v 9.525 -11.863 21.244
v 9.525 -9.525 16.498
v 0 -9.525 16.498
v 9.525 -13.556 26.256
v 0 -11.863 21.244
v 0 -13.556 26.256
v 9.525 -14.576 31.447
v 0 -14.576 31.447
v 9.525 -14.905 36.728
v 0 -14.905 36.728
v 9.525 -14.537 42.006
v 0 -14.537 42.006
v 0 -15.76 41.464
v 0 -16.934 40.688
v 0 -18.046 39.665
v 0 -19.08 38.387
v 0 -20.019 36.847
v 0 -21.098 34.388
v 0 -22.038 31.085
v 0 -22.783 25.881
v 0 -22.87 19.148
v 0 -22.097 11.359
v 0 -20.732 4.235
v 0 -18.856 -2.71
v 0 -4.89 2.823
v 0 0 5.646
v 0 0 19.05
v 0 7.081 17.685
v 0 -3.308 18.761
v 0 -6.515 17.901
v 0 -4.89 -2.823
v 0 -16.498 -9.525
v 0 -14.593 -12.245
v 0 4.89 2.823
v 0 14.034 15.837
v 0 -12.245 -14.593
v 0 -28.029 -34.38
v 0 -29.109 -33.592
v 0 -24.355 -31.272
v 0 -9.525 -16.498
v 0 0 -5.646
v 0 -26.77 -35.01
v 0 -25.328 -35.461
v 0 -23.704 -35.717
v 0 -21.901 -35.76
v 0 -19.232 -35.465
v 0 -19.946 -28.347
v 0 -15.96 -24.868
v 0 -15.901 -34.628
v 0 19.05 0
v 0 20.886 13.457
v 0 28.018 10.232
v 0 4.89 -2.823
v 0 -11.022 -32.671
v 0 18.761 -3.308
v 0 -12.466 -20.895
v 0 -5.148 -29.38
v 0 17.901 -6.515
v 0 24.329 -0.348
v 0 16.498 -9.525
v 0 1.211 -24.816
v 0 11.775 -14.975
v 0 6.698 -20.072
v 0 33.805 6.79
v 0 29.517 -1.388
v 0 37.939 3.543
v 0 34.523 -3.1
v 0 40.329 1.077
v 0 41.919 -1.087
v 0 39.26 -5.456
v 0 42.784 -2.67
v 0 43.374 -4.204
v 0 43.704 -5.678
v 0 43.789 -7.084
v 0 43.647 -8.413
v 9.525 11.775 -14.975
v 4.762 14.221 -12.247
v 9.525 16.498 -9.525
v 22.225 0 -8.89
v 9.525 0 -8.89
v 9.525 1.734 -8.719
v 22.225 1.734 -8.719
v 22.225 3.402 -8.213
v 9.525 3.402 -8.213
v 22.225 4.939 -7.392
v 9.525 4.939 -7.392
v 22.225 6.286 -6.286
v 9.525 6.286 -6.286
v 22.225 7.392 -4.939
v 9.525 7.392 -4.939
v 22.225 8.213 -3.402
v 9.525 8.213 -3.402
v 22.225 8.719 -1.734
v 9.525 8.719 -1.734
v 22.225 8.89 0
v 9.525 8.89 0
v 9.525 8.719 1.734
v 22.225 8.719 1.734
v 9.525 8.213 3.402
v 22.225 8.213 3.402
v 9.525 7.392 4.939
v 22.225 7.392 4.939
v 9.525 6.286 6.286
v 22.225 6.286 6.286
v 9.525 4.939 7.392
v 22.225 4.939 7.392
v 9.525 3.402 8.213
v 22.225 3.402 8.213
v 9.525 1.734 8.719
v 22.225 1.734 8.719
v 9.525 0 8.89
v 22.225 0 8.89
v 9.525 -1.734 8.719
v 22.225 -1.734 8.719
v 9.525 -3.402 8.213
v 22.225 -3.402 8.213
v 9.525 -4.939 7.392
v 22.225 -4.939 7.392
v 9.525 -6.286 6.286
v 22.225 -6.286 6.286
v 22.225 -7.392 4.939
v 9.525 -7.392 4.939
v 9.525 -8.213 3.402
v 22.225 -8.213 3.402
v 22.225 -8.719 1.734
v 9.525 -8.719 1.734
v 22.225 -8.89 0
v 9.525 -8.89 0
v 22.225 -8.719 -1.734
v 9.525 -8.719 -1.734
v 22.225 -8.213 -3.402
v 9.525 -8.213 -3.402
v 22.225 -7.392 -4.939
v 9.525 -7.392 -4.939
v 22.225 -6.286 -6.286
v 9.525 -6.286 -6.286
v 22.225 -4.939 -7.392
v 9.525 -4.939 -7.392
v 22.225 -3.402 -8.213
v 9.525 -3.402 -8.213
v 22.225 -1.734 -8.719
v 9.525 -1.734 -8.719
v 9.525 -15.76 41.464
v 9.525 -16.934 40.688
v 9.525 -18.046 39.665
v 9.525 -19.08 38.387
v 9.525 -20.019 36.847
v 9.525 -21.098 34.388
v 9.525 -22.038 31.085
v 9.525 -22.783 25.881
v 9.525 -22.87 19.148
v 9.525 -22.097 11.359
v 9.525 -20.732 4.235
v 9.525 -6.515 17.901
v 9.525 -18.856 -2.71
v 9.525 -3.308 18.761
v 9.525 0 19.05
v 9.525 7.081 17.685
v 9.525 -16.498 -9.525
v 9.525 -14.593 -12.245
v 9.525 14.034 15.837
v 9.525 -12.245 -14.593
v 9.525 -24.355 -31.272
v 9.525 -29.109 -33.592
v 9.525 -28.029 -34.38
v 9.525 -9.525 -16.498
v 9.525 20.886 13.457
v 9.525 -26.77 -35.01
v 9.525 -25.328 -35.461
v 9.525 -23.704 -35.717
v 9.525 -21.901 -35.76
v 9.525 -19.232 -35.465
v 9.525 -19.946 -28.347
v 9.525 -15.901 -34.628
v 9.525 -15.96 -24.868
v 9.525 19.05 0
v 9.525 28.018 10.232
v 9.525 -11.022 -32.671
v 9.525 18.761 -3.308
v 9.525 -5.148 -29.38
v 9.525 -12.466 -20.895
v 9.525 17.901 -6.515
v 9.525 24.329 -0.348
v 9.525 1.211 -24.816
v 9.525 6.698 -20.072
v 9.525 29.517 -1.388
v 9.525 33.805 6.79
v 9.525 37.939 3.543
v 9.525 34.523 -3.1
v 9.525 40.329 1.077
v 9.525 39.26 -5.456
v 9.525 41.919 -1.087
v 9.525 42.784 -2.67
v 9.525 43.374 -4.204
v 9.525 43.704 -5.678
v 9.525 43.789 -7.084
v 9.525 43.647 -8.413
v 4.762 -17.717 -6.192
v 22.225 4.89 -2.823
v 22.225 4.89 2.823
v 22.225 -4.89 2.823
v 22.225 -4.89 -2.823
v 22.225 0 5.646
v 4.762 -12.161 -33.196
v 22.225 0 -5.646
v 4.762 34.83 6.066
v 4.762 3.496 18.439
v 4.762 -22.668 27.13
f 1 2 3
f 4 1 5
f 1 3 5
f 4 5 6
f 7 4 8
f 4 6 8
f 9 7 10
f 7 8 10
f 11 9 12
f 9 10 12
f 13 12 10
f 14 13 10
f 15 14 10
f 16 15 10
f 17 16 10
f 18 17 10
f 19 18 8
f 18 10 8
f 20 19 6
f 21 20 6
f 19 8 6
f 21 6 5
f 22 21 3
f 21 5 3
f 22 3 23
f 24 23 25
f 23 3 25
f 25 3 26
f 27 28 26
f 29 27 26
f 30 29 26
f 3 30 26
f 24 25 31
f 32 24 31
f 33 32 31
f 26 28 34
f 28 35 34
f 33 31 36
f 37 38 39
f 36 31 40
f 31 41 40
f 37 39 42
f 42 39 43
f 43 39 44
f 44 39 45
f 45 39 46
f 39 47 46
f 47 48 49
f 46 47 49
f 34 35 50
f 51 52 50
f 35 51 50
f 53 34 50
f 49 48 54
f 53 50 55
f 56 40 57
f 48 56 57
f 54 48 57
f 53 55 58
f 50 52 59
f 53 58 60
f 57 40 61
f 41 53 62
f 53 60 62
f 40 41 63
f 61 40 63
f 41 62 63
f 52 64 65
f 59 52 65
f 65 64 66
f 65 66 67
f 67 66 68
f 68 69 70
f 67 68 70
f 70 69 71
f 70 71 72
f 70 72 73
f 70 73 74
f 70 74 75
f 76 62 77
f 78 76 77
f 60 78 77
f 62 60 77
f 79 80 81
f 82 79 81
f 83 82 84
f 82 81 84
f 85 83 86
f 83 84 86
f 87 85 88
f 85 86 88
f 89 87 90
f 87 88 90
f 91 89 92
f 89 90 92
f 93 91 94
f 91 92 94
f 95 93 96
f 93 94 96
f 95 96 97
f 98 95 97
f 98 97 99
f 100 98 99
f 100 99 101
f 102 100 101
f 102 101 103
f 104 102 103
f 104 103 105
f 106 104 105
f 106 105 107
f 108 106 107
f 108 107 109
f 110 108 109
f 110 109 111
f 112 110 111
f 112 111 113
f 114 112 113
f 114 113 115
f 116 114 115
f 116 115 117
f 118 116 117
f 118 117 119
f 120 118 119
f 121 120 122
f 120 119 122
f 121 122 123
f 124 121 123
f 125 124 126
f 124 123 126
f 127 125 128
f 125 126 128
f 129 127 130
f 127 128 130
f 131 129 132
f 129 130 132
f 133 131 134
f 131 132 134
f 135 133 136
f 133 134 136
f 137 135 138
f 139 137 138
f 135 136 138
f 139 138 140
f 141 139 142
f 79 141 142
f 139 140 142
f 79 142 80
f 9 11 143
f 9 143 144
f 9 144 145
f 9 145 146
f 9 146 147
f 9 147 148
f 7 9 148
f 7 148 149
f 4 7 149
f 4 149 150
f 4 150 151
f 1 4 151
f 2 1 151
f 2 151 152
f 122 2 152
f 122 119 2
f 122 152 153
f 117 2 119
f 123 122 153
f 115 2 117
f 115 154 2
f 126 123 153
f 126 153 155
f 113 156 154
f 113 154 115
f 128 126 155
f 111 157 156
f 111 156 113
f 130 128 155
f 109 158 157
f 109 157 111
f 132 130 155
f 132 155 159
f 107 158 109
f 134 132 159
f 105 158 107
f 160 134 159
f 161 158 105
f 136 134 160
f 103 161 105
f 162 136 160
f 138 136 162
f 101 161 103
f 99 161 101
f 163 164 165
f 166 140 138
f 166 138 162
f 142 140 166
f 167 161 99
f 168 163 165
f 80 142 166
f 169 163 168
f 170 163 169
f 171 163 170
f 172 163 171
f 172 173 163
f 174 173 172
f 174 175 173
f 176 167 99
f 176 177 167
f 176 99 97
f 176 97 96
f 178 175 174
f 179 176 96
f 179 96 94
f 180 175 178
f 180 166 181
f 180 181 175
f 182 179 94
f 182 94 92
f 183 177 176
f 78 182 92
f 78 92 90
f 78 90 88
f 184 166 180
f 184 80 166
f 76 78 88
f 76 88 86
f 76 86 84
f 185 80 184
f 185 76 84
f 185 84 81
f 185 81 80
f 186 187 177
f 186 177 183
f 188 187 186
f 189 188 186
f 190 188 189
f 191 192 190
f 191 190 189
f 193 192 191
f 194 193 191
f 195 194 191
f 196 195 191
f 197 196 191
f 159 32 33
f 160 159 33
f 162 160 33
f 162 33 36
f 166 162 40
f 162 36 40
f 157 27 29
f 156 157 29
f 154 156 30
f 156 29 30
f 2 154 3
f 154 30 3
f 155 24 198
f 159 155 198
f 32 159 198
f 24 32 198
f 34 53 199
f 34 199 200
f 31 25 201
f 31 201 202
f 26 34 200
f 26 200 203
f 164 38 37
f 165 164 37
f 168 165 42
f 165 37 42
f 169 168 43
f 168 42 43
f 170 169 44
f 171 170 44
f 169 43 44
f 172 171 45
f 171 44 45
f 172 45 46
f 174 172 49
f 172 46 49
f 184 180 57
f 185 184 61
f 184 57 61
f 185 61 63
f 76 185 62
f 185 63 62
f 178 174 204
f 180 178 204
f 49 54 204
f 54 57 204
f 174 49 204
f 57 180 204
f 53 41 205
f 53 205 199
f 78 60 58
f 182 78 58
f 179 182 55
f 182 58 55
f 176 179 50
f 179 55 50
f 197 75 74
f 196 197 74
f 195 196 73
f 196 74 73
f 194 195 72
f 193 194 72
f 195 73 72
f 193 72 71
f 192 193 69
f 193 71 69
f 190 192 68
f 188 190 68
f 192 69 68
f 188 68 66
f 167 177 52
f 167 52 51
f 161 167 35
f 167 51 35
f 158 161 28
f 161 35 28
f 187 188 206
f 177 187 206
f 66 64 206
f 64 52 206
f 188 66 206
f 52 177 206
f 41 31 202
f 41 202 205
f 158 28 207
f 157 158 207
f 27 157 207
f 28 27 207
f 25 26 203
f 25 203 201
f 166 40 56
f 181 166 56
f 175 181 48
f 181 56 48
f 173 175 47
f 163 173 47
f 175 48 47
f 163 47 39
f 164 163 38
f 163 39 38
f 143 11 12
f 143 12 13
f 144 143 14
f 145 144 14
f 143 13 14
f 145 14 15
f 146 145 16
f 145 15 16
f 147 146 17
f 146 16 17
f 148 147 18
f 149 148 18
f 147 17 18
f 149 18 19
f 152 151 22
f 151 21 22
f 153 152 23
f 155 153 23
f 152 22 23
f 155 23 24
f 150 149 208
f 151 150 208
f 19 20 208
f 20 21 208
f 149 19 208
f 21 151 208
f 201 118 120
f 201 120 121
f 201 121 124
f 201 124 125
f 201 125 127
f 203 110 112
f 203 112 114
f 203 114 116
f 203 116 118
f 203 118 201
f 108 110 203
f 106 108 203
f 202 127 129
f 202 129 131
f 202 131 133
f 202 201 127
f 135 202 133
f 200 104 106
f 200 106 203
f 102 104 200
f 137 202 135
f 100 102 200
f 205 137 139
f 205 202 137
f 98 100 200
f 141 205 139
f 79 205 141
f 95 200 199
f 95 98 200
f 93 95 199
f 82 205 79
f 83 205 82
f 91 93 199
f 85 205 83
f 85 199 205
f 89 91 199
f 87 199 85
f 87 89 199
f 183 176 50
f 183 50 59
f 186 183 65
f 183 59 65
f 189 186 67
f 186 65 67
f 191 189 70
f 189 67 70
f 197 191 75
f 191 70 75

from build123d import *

# Parameters (mm, degrees)
BOSS_EXTRUDE2_DEPTH = 9.525
SKETCH1_7_R         = 8.89
BOSS_EXTRUDE4_DEPTH = 22.225


with BuildPart() as part:
    # Sketch1 → Boss-Extrude2 (new body)
    with BuildSketch(Plane(origin=(0, 0, 0), x_dir=(0, 0, -1), z_dir=(1, 0, 0))):
        with BuildLine():
            ThreePointArc((9.525, 16.497783942), (4.930502809, 18.400886991), (0, 19.05))
            ThreePointArc((0, 19.05), (2.161493982, 32.047813076), (8.413309173, 43.646520237))
            add(Edge.make_bspline(
                [(8.413309173, 43.646520237), (3.572991313, 44.579540565), (-2.983083494, 41.836213327), (-9.860033792, 32.789051702), (-14.919789948, 19.175608051), (-18.015988155, 5.633638353), (-18.31734725, 4.197175442), (-18.589544271, 2.776695083), (-18.833400518, 1.3765002), (-19.05, 0)],
                knots=[3.141592654, 3.141592654, 3.141592654, 3.141592654, 3.141592654, 3.141592654, 4.617024129, 4.617024129, 4.617024129, 4.617024129, 4.793596405, 4.793596405, 4.793596405, 4.793596405, 4.793596405, 4.793596405], degree=5, weights=[1, 1, 0.97421635, 0.97065359, 1, 1, 1.000001514, 1.000002053, 1, 1]))
            ThreePointArc((-19.05, 0), (-18.400886991, -4.930502809), (-16.497783942, -9.525))
            ThreePointArc((-16.497783942, -9.525), (-28.83496725, -14.151997839), (-42.005649898, -14.537120645))
            add(Edge.make_bspline(
                [(-42.005649898, -14.537120645), (-40.393510275, -19.195469038), (-34.739681792, -23.501532751), (-23.466134844, -24.933565597), (-9.146668731, -22.508721139), (4.129120148, -18.419122593), (5.523813068, -17.961875769), (6.890083655, -17.487365125), (8.224616117, -16.998453388), (9.525, -16.497783942)],
                knots=[0, 0, 0, 0, 0, 0, 1.475431476, 1.475431476, 1.475431476, 1.475431476, 1.652003752, 1.652003752, 1.652003752, 1.652003752, 1.652003752, 1.652003752], degree=5, weights=[1, 1, 0.97421635, 0.97065359, 1, 1, 1.000001514, 1.000002053, 1, 1]))
            ThreePointArc((9.525, -16.497783942), (13.470384182, -13.470384182), (16.497783942, -9.525))
            ThreePointArc((16.497783942, -9.525), (26.673473268, -17.895815237), (33.592340725, -29.109399592))
            add(Edge.make_bspline(
                [(33.592340725, -29.109399592), (36.820518962, -25.384071527), (37.722765286, -18.334680576), (33.326168636, -7.855486105), (24.066458679, 3.333113088), (13.886868007, 12.78548424), (12.793534182, 13.764700327), (11.699460616, 14.710670041), (10.6087844, 15.621953188), (9.525, 16.497783942)],
                knots=[0, 0, 0, 0, 0, 0, 1.475431476, 1.475431476, 1.475431476, 1.475431476, 1.652003752, 1.652003752, 1.652003752, 1.652003752, 1.652003752, 1.652003752], degree=5, weights=[1, 1, 0.97421635, 0.97065359, 1, 1, 1.000001514, 1.000002053, 1, 1]))
        make_face()
        Polygon((5.645908282, 0), (2.822954141, -4.8895), (-2.822954141, -4.8895), (-5.645908282, 0), (-2.822954141, 4.8895), (2.822954141, 4.8895), align=None, mode=Mode.SUBTRACT)
    extrude(amount=BOSS_EXTRUDE2_DEPTH)

    # Sketch1<7> → Boss-Extrude4 (add)
    with BuildSketch(Plane(origin=(0, 0, 0), x_dir=(0, 0, -1), z_dir=(1, 0, 0))):
        Circle(SKETCH1_7_R)
        Polygon((2.822954141, 4.8895), (5.645908282, 0), (2.822954141, -4.8895), (-2.822954141, -4.8895), (-5.645908282, 0), (-2.822954141, 4.8895), align=None, mode=Mode.SUBTRACT)
    extrude(amount=BOSS_EXTRUDE4_DEPTH)


solid = part.part
